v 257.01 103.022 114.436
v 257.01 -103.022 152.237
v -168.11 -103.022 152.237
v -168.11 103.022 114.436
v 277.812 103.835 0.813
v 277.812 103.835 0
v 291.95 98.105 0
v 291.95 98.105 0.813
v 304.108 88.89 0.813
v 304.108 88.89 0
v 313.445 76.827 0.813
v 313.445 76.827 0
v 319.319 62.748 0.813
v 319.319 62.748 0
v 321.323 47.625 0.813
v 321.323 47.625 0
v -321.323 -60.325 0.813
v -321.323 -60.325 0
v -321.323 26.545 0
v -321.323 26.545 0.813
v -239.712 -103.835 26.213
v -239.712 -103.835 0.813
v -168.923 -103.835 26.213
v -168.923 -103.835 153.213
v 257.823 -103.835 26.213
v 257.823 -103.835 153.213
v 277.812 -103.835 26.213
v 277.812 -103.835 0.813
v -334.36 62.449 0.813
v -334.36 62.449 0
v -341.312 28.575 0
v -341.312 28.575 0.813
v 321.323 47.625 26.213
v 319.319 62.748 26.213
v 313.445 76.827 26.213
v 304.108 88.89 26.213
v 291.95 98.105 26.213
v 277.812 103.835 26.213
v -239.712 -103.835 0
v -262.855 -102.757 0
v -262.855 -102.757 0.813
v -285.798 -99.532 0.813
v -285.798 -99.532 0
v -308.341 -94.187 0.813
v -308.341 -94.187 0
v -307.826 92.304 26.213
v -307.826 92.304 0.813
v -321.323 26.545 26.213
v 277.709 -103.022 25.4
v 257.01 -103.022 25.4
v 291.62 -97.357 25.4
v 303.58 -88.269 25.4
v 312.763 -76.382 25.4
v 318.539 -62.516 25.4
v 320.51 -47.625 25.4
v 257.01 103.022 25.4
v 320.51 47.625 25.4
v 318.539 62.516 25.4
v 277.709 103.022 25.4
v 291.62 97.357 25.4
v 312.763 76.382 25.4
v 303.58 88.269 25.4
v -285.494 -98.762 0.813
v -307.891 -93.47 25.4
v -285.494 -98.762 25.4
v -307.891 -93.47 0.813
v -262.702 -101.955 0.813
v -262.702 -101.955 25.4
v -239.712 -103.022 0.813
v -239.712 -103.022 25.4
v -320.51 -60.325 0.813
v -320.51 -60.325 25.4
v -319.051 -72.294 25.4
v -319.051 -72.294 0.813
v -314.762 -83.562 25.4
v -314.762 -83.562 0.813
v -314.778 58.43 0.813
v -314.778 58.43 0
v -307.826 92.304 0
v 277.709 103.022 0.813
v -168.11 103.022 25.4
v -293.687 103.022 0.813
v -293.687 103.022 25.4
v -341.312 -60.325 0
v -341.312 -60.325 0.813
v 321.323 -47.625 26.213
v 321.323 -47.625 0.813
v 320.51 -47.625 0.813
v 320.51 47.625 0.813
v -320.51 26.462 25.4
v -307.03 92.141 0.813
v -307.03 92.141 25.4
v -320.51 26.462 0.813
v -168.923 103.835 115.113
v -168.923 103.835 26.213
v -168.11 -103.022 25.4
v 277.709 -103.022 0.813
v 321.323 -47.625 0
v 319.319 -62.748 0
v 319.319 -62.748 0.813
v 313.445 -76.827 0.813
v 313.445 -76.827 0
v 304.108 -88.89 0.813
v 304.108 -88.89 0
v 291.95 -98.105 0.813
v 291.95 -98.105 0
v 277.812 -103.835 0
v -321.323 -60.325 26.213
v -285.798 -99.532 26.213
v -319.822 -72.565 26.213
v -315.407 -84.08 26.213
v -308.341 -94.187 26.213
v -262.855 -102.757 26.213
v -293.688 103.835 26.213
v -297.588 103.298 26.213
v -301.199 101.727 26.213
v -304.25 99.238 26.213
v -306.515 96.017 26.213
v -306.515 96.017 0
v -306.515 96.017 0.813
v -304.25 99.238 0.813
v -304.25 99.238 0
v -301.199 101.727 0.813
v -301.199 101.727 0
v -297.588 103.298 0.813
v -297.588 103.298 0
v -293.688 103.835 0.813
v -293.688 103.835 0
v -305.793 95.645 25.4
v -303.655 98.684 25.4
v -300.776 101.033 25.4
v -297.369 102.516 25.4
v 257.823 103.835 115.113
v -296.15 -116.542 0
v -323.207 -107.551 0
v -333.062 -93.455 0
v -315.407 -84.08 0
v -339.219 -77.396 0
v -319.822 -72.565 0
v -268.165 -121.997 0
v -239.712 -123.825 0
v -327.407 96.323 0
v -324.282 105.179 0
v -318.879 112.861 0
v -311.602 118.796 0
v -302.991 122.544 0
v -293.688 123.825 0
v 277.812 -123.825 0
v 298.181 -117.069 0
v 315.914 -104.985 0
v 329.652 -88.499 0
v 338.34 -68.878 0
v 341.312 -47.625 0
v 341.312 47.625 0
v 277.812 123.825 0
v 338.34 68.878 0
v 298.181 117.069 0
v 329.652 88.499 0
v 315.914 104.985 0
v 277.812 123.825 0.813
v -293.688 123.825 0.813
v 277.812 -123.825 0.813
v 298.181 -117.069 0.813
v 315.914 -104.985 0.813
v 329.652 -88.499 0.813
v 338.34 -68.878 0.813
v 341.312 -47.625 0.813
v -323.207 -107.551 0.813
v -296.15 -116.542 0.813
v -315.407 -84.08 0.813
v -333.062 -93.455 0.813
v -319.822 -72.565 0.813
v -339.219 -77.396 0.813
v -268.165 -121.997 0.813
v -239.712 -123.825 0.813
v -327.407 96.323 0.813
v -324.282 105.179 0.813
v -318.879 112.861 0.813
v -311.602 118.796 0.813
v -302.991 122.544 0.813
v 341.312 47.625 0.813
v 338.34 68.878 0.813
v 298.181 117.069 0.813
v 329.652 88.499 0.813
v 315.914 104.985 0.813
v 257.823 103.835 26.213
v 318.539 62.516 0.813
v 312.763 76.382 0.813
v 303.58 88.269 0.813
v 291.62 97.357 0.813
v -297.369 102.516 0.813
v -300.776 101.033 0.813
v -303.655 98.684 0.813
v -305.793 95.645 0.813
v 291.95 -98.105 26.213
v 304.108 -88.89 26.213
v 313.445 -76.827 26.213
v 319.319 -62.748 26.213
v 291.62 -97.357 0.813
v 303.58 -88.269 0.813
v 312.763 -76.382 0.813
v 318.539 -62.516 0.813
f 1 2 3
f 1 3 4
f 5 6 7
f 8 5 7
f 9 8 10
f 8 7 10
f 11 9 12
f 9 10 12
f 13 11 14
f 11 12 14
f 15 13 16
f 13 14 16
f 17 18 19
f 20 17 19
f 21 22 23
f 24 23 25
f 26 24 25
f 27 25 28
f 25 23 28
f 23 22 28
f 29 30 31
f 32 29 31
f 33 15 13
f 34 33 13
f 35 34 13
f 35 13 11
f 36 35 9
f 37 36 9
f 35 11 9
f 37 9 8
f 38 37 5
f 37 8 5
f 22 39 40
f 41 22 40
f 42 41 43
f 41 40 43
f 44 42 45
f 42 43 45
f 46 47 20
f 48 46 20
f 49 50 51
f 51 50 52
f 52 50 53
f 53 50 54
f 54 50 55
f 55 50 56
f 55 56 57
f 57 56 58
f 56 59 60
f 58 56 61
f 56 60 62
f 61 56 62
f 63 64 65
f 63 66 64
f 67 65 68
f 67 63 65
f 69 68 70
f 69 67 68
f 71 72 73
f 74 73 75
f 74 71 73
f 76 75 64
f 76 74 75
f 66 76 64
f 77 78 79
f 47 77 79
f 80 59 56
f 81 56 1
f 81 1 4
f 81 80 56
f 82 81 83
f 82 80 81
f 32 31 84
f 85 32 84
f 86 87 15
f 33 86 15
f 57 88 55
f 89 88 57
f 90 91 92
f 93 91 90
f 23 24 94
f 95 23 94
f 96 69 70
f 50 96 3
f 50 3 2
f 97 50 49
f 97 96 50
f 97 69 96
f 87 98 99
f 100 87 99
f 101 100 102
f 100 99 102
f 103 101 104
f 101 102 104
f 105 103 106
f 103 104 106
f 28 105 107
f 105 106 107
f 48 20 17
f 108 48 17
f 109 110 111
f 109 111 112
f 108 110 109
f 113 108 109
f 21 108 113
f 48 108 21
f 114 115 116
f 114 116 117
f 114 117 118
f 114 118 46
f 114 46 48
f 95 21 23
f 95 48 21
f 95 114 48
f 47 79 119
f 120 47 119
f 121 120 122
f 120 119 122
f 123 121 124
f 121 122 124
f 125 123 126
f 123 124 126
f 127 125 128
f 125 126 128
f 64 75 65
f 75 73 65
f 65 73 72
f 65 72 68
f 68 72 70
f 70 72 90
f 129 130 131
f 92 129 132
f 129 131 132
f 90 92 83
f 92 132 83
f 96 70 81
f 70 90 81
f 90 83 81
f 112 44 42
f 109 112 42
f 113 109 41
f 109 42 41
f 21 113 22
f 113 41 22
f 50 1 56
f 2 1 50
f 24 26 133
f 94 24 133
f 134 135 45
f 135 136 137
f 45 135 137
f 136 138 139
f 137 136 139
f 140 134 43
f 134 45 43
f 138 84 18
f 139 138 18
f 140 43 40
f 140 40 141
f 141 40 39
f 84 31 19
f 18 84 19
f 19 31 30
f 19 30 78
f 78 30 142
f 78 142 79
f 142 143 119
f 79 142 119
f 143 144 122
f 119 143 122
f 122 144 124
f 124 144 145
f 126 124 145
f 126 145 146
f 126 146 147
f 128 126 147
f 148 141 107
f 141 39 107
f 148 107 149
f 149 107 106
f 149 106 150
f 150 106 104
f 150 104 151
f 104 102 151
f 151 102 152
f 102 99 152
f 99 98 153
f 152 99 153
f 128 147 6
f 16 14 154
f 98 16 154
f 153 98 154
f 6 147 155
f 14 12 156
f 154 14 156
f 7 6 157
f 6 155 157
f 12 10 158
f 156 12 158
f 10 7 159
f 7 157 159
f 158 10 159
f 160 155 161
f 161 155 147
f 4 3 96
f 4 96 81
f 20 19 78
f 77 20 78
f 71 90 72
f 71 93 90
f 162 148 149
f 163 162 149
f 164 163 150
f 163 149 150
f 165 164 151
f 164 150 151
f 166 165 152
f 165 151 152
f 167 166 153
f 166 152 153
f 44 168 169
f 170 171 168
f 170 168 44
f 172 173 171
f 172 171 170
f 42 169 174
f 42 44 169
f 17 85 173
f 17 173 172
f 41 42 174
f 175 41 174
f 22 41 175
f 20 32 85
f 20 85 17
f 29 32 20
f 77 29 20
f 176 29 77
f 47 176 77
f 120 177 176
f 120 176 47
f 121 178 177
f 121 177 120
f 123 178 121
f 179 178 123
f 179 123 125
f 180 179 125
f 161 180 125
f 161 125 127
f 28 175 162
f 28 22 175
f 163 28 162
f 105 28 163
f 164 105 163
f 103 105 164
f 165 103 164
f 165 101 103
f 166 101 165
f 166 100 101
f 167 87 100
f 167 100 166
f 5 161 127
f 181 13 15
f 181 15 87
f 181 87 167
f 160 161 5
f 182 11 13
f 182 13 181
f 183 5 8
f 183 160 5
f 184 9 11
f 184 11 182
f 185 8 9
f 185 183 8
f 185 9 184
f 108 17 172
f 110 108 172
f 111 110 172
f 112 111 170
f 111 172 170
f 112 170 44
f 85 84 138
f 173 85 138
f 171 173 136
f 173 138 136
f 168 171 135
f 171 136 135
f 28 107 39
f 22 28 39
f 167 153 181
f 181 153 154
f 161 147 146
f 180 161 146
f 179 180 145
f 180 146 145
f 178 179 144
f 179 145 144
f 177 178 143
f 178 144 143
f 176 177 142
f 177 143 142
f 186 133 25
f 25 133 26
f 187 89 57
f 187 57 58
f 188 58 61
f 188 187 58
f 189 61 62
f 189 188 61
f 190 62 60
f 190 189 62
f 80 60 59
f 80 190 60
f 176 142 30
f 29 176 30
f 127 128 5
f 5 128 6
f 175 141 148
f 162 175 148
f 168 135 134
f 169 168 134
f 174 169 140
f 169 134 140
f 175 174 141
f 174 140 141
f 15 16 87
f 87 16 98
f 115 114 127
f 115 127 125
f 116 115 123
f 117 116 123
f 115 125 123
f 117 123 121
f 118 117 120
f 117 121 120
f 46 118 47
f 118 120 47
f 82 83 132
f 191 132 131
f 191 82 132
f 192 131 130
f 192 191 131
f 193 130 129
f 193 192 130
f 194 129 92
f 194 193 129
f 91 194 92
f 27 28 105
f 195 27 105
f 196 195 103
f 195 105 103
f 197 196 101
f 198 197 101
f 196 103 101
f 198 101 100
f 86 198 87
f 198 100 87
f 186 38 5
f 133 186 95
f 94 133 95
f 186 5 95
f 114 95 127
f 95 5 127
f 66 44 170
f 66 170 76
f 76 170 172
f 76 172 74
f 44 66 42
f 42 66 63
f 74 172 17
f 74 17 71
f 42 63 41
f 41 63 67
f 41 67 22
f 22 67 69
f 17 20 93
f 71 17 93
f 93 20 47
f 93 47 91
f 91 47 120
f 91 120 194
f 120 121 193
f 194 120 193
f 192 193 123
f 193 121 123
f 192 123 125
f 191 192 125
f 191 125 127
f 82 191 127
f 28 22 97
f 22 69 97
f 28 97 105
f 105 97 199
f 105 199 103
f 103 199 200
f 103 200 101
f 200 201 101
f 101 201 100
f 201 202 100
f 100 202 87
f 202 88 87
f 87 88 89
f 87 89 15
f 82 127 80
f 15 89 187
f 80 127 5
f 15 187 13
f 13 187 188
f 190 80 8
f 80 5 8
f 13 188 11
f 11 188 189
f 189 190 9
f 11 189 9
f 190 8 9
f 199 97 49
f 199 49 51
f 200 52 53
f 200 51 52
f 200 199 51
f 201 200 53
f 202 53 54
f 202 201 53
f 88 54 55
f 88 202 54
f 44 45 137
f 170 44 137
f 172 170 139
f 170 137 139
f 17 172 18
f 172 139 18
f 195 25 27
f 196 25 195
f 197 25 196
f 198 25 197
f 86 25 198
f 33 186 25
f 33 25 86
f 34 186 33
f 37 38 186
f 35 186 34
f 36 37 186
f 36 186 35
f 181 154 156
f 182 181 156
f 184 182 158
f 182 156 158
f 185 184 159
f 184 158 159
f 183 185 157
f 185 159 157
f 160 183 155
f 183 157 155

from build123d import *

# Parameters (mm, degrees)
F0_W     = 293.6875
F0_H     = 19.9898
F0_W_2   = 19.9898
F0_H_2   = 60.325
F0_W_3   = 277.8125
F0_H_3   = 47.625
F1_DEPTH = 0.8128
F3_DEPTH = 152.4
F5_DEPTH = 127
F7_DEPTH = 127
F9_DEPTH = 599.1362
F10_T    = -0.8128


with BuildPart() as f1:
    # F0 (on Top) → F1 (new body)
    with BuildSketch(Plane.XY):
        with Locations((-146.84375, 113.8301)):
            Rectangle(F0_W, F0_H)
        with BuildLine():
            Line((-293.6875, 103.8352), (-293.6875, 123.825))
            ThreePointArc((-293.6875, 123.825), (-315.444039303, 116.0777065094), (-327.4074100997, 96.3230787465))
            Line((-327.4074100997, 96.3230787465), (-307.8258060613, 92.3040132677))
            ThreePointArc((-307.8258060613, 92.3040132677), (-302.8097251361, 100.5868637443), (-293.6875, 103.8352))
        make_face()
        Polygon((-307.8258060613, 92.3040132677), (-327.4074100997, 96.3230787465), (-334.3599550499, 62.4490393733), (-314.7783510115, 58.4299738945), align=None)
        Polygon((-334.3599550499, 62.4490393733), (-341.3125, 28.575), (-341.3125, 0), (-321.3227, 0), (-321.3227, 26.5447380707), (-314.7783510115, 58.4299738945), align=None)
        with Locations((-331.3176, -30.1625)):
            Rectangle(F0_W_2, F0_H_2)
        with BuildLine():
            Line((-321.3227, -60.325), (-341.3125, -60.325))
            ThreePointArc((-341.3125, -60.325), (-336.6310537443, -85.6136120379), (-323.2071786147, -107.550553811))
            Line((-323.2071786147, -107.550553811), (-308.340574275, -94.1873139551))
            ThreePointArc((-308.340574275, -94.1873139551), (-317.9659452331, -78.4577872563), (-321.3227, -60.325))
        make_face()
        with BuildLine():
            Line((-308.340574275, -94.1873139551), (-323.2071786147, -107.550553811))
            ThreePointArc((-323.2071786147, -107.550553811), (-282.2454841292, -119.7184616454), (-239.7125, -123.825))
            Line((-239.7125, -123.825), (-239.7125, -103.8352))
            ThreePointArc((-239.7125, -103.8352), (-274.3639584247, -101.4114276523), (-308.340574275, -94.1873139551))
        make_face()
        Polygon((0, -123.825), (0, -103.8352), (-214.3125, -103.8352), (-239.7125, -103.8352), (-239.7125, -123.825), align=None)
        with BuildLine():
            ThreePointArc((277.8125, -123.825), (323.3566025304, -97.220085442), (341.3125, -47.625))
            Line((341.3125, -47.625), (321.3227, -47.625))
            ThreePointArc((321.3227, -47.625), (309.1742653298, -83.1662580253), (277.8125, -103.8352))
            Line((277.8125, -103.8352), (277.8125, -123.825))
        make_face()
        with Locations((138.90625, -113.8301)):
            Rectangle(F0_W_3, F0_H)
        Polygon((341.3125, -47.625), (341.3125, 0), (321.3227, 0), (321.3227, -22.225), (321.3227, -47.625), align=None)
        with Locations((331.3176, 23.8125)):
            Rectangle(F0_W_2, F0_H_3)
        with BuildLine():
            ThreePointArc((341.3125, 47.625), (323.3566025304, 97.220085442), (277.8125, 123.825))
            Line((277.8125, 123.825), (277.8125, 103.8352))
            ThreePointArc((277.8125, 103.8352), (309.1742653298, 83.1662580253), (321.3227, 47.625))
            Line((321.3227, 47.625), (341.3125, 47.625))
        make_face()
        with Locations((138.90625, 113.8301)):
            Rectangle(F0_W_3, F0_H)
    extrude(amount=F1_DEPTH)


with BuildPart() as f3:
    # F2 (on face) → F3 (new body)
    with BuildSketch(Plane.XY.offset(0.8128)):
        with BuildLine():
            ThreePointArc((321.3227, 47.625), (309.1742653298, 83.1662580253), (277.8125, 103.8352))
            Line((277.8125, 103.8352), (-293.6875, 103.8352))
            ThreePointArc((-293.6875, 103.8352), (-302.8097251361, 100.5868637443), (-307.8258060613, 92.3040132677))
            Line((-307.8258060613, 92.3040132677), (-321.3227, 26.5447380707))
            Line((-321.3227, 26.5447380707), (-321.3227, -60.325))
            ThreePointArc((-321.3227, -60.325), (-317.9659452331, -78.4577872563), (-308.340574275, -94.1873139551))
            ThreePointArc((-308.340574275, -94.1873139551), (-274.3639584247, -101.4114276523), (-239.7125, -103.8352))
            Line((-239.7125, -103.8352), (277.8125, -103.8352))
            ThreePointArc((277.8125, -103.8352), (309.1742653298, -83.1662580253), (321.3227, -47.625))
            Line((321.3227, -47.625), (321.3227, 47.625))
        make_face()
    extrude(amount=F3_DEPTH)

    # F4 (on face) → F5 (cut)
    with BuildSketch(Plane.XY.offset(153.2128)):
        with BuildLine():
            Line((-168.9227, -103.8352), (-168.9227, 103.8352))
            Line((-168.9227, 103.8352), (-293.6875, 103.8352))
            ThreePointArc((-293.6875, 103.8352), (-302.8097251361, 100.5868637443), (-307.8258060613, 92.3040132677))
            Line((-307.8258060613, 92.3040132677), (-321.3227, 26.5447380707))
            Line((-321.3227, 26.5447380707), (-321.3227, -60.325))
            ThreePointArc((-321.3227, -60.325), (-317.9659452331, -78.4577872563), (-308.340574275, -94.1873139551))
            ThreePointArc((-308.340574275, -94.1873139551), (-274.3639584247, -101.4114276523), (-239.7125, -103.8352))
            Line((-239.7125, -103.8352), (-168.9227, -103.8352))
        make_face()
    extrude(amount=-F5_DEPTH, mode=Mode.SUBTRACT)

    # F6 (on face) → F7 (cut)
    with BuildSketch(Plane.XY.offset(153.2128)):
        with BuildLine():
            Line((257.8227, 103.8352), (257.8227, -103.8352))
            Line((257.8227, -103.8352), (277.8125, -103.8352))
            ThreePointArc((277.8125, -103.8352), (309.1742653298, -83.1662580253), (321.3227, -47.625))
            Line((321.3227, -47.625), (321.3227, 47.625))
            ThreePointArc((321.3227, 47.625), (309.1742653298, 83.1662580253), (277.8125, 103.8352))
            Line((277.8125, 103.8352), (257.8227, 103.8352))
        make_face()
    extrude(amount=-F7_DEPTH, mode=Mode.SUBTRACT)

    # F8 (on face) → F9 (cut, through all)
    with BuildSketch(Plane.YZ.offset(257.8227)):
        Polygon((103.8352, 153.2128), (-103.8352, 153.2128), (103.8352, 115.1128), align=None)
    extrude(amount=-F9_DEPTH, mode=Mode.SUBTRACT)

    # F10
    f10_openings = [f3.faces().sort_by_distance(p)[0] for p in [
        (-0.33469, -0.032507, 0.8128),
    ]]
    offset(amount=F10_T, openings=f10_openings, kind=Kind.INTERSECTION)


solid = Compound([f1.part, f3.part])
